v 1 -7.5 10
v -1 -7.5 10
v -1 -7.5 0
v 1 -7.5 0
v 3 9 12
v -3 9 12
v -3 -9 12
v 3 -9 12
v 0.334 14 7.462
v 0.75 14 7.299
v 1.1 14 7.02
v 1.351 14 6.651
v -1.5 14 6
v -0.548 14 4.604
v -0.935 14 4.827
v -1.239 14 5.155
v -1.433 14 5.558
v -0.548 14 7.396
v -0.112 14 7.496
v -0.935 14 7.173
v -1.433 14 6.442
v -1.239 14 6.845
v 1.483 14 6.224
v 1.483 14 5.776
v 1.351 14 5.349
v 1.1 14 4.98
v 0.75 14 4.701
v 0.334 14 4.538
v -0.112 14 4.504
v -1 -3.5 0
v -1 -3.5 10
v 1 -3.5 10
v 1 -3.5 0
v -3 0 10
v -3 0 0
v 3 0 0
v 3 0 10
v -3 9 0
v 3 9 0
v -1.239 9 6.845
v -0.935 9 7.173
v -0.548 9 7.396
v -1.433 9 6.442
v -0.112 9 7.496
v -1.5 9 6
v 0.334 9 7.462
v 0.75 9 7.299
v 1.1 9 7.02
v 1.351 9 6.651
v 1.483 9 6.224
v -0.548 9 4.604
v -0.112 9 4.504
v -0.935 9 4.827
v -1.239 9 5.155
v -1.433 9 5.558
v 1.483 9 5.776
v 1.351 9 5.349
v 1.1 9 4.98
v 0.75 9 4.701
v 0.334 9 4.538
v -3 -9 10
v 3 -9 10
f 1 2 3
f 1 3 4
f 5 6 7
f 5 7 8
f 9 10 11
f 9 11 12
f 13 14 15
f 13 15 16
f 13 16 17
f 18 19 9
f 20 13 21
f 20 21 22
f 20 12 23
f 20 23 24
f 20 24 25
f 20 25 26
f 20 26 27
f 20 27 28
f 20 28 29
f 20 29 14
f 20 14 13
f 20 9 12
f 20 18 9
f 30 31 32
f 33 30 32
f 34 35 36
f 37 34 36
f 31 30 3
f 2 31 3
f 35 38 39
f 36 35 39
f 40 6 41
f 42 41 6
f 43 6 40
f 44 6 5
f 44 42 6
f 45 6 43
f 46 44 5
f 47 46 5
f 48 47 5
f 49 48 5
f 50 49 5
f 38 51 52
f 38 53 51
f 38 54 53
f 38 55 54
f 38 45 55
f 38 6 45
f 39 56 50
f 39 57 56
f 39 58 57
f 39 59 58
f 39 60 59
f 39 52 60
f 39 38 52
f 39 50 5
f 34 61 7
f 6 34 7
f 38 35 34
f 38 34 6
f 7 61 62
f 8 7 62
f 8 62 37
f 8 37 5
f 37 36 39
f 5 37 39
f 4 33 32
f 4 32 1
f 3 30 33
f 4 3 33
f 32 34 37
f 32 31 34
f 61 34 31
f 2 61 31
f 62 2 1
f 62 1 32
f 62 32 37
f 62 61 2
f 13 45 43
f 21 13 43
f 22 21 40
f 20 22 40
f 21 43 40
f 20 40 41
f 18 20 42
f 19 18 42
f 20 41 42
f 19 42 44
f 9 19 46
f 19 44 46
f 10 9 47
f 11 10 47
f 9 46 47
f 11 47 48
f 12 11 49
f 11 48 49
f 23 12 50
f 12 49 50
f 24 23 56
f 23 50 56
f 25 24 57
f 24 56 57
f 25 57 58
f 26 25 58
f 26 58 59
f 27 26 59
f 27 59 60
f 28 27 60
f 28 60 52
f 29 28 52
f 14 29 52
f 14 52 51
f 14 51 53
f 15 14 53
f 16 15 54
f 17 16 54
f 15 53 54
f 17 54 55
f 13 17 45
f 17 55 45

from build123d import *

# Parameters (mm, degrees)
F0_W     = 6
F0_H     = 18
F1_DEPTH = 12
F2_W     = 6
F2_H     = 9
F2_W_2   = 2
F2_H_2   = 4
F3_DEPTH = 10
F4_R     = 1.5
F5_DEPTH = 5


with BuildPart() as f1:
    # F0 (on Top) → F1 (new body)
    with BuildSketch(Plane.XY):
        Rectangle(F0_W, F0_H)
    extrude(amount=F1_DEPTH)

    # F2 (on face) → F3 (cut)
    with BuildSketch(Plane(origin=(0, 0, 0), x_dir=(1, 0, 0), z_dir=(0, 0, -1))):
        with Locations((0, 4.5)):
            Rectangle(F2_W, F2_H)
        with Locations((0, 5.5)):
            Rectangle(F2_W_2, F2_H_2, mode=Mode.SUBTRACT)
    extrude(amount=-F3_DEPTH, mode=Mode.SUBTRACT)

    # F4 (on face) → F5 (join)
    with BuildSketch(Plane(origin=(0, 9, 0), x_dir=(-1, 0, 0), z_dir=(0, 1, 0))):
        with Locations((0, 6)):
            Circle(F4_R)
    extrude(amount=F5_DEPTH)


solid = f1.part
